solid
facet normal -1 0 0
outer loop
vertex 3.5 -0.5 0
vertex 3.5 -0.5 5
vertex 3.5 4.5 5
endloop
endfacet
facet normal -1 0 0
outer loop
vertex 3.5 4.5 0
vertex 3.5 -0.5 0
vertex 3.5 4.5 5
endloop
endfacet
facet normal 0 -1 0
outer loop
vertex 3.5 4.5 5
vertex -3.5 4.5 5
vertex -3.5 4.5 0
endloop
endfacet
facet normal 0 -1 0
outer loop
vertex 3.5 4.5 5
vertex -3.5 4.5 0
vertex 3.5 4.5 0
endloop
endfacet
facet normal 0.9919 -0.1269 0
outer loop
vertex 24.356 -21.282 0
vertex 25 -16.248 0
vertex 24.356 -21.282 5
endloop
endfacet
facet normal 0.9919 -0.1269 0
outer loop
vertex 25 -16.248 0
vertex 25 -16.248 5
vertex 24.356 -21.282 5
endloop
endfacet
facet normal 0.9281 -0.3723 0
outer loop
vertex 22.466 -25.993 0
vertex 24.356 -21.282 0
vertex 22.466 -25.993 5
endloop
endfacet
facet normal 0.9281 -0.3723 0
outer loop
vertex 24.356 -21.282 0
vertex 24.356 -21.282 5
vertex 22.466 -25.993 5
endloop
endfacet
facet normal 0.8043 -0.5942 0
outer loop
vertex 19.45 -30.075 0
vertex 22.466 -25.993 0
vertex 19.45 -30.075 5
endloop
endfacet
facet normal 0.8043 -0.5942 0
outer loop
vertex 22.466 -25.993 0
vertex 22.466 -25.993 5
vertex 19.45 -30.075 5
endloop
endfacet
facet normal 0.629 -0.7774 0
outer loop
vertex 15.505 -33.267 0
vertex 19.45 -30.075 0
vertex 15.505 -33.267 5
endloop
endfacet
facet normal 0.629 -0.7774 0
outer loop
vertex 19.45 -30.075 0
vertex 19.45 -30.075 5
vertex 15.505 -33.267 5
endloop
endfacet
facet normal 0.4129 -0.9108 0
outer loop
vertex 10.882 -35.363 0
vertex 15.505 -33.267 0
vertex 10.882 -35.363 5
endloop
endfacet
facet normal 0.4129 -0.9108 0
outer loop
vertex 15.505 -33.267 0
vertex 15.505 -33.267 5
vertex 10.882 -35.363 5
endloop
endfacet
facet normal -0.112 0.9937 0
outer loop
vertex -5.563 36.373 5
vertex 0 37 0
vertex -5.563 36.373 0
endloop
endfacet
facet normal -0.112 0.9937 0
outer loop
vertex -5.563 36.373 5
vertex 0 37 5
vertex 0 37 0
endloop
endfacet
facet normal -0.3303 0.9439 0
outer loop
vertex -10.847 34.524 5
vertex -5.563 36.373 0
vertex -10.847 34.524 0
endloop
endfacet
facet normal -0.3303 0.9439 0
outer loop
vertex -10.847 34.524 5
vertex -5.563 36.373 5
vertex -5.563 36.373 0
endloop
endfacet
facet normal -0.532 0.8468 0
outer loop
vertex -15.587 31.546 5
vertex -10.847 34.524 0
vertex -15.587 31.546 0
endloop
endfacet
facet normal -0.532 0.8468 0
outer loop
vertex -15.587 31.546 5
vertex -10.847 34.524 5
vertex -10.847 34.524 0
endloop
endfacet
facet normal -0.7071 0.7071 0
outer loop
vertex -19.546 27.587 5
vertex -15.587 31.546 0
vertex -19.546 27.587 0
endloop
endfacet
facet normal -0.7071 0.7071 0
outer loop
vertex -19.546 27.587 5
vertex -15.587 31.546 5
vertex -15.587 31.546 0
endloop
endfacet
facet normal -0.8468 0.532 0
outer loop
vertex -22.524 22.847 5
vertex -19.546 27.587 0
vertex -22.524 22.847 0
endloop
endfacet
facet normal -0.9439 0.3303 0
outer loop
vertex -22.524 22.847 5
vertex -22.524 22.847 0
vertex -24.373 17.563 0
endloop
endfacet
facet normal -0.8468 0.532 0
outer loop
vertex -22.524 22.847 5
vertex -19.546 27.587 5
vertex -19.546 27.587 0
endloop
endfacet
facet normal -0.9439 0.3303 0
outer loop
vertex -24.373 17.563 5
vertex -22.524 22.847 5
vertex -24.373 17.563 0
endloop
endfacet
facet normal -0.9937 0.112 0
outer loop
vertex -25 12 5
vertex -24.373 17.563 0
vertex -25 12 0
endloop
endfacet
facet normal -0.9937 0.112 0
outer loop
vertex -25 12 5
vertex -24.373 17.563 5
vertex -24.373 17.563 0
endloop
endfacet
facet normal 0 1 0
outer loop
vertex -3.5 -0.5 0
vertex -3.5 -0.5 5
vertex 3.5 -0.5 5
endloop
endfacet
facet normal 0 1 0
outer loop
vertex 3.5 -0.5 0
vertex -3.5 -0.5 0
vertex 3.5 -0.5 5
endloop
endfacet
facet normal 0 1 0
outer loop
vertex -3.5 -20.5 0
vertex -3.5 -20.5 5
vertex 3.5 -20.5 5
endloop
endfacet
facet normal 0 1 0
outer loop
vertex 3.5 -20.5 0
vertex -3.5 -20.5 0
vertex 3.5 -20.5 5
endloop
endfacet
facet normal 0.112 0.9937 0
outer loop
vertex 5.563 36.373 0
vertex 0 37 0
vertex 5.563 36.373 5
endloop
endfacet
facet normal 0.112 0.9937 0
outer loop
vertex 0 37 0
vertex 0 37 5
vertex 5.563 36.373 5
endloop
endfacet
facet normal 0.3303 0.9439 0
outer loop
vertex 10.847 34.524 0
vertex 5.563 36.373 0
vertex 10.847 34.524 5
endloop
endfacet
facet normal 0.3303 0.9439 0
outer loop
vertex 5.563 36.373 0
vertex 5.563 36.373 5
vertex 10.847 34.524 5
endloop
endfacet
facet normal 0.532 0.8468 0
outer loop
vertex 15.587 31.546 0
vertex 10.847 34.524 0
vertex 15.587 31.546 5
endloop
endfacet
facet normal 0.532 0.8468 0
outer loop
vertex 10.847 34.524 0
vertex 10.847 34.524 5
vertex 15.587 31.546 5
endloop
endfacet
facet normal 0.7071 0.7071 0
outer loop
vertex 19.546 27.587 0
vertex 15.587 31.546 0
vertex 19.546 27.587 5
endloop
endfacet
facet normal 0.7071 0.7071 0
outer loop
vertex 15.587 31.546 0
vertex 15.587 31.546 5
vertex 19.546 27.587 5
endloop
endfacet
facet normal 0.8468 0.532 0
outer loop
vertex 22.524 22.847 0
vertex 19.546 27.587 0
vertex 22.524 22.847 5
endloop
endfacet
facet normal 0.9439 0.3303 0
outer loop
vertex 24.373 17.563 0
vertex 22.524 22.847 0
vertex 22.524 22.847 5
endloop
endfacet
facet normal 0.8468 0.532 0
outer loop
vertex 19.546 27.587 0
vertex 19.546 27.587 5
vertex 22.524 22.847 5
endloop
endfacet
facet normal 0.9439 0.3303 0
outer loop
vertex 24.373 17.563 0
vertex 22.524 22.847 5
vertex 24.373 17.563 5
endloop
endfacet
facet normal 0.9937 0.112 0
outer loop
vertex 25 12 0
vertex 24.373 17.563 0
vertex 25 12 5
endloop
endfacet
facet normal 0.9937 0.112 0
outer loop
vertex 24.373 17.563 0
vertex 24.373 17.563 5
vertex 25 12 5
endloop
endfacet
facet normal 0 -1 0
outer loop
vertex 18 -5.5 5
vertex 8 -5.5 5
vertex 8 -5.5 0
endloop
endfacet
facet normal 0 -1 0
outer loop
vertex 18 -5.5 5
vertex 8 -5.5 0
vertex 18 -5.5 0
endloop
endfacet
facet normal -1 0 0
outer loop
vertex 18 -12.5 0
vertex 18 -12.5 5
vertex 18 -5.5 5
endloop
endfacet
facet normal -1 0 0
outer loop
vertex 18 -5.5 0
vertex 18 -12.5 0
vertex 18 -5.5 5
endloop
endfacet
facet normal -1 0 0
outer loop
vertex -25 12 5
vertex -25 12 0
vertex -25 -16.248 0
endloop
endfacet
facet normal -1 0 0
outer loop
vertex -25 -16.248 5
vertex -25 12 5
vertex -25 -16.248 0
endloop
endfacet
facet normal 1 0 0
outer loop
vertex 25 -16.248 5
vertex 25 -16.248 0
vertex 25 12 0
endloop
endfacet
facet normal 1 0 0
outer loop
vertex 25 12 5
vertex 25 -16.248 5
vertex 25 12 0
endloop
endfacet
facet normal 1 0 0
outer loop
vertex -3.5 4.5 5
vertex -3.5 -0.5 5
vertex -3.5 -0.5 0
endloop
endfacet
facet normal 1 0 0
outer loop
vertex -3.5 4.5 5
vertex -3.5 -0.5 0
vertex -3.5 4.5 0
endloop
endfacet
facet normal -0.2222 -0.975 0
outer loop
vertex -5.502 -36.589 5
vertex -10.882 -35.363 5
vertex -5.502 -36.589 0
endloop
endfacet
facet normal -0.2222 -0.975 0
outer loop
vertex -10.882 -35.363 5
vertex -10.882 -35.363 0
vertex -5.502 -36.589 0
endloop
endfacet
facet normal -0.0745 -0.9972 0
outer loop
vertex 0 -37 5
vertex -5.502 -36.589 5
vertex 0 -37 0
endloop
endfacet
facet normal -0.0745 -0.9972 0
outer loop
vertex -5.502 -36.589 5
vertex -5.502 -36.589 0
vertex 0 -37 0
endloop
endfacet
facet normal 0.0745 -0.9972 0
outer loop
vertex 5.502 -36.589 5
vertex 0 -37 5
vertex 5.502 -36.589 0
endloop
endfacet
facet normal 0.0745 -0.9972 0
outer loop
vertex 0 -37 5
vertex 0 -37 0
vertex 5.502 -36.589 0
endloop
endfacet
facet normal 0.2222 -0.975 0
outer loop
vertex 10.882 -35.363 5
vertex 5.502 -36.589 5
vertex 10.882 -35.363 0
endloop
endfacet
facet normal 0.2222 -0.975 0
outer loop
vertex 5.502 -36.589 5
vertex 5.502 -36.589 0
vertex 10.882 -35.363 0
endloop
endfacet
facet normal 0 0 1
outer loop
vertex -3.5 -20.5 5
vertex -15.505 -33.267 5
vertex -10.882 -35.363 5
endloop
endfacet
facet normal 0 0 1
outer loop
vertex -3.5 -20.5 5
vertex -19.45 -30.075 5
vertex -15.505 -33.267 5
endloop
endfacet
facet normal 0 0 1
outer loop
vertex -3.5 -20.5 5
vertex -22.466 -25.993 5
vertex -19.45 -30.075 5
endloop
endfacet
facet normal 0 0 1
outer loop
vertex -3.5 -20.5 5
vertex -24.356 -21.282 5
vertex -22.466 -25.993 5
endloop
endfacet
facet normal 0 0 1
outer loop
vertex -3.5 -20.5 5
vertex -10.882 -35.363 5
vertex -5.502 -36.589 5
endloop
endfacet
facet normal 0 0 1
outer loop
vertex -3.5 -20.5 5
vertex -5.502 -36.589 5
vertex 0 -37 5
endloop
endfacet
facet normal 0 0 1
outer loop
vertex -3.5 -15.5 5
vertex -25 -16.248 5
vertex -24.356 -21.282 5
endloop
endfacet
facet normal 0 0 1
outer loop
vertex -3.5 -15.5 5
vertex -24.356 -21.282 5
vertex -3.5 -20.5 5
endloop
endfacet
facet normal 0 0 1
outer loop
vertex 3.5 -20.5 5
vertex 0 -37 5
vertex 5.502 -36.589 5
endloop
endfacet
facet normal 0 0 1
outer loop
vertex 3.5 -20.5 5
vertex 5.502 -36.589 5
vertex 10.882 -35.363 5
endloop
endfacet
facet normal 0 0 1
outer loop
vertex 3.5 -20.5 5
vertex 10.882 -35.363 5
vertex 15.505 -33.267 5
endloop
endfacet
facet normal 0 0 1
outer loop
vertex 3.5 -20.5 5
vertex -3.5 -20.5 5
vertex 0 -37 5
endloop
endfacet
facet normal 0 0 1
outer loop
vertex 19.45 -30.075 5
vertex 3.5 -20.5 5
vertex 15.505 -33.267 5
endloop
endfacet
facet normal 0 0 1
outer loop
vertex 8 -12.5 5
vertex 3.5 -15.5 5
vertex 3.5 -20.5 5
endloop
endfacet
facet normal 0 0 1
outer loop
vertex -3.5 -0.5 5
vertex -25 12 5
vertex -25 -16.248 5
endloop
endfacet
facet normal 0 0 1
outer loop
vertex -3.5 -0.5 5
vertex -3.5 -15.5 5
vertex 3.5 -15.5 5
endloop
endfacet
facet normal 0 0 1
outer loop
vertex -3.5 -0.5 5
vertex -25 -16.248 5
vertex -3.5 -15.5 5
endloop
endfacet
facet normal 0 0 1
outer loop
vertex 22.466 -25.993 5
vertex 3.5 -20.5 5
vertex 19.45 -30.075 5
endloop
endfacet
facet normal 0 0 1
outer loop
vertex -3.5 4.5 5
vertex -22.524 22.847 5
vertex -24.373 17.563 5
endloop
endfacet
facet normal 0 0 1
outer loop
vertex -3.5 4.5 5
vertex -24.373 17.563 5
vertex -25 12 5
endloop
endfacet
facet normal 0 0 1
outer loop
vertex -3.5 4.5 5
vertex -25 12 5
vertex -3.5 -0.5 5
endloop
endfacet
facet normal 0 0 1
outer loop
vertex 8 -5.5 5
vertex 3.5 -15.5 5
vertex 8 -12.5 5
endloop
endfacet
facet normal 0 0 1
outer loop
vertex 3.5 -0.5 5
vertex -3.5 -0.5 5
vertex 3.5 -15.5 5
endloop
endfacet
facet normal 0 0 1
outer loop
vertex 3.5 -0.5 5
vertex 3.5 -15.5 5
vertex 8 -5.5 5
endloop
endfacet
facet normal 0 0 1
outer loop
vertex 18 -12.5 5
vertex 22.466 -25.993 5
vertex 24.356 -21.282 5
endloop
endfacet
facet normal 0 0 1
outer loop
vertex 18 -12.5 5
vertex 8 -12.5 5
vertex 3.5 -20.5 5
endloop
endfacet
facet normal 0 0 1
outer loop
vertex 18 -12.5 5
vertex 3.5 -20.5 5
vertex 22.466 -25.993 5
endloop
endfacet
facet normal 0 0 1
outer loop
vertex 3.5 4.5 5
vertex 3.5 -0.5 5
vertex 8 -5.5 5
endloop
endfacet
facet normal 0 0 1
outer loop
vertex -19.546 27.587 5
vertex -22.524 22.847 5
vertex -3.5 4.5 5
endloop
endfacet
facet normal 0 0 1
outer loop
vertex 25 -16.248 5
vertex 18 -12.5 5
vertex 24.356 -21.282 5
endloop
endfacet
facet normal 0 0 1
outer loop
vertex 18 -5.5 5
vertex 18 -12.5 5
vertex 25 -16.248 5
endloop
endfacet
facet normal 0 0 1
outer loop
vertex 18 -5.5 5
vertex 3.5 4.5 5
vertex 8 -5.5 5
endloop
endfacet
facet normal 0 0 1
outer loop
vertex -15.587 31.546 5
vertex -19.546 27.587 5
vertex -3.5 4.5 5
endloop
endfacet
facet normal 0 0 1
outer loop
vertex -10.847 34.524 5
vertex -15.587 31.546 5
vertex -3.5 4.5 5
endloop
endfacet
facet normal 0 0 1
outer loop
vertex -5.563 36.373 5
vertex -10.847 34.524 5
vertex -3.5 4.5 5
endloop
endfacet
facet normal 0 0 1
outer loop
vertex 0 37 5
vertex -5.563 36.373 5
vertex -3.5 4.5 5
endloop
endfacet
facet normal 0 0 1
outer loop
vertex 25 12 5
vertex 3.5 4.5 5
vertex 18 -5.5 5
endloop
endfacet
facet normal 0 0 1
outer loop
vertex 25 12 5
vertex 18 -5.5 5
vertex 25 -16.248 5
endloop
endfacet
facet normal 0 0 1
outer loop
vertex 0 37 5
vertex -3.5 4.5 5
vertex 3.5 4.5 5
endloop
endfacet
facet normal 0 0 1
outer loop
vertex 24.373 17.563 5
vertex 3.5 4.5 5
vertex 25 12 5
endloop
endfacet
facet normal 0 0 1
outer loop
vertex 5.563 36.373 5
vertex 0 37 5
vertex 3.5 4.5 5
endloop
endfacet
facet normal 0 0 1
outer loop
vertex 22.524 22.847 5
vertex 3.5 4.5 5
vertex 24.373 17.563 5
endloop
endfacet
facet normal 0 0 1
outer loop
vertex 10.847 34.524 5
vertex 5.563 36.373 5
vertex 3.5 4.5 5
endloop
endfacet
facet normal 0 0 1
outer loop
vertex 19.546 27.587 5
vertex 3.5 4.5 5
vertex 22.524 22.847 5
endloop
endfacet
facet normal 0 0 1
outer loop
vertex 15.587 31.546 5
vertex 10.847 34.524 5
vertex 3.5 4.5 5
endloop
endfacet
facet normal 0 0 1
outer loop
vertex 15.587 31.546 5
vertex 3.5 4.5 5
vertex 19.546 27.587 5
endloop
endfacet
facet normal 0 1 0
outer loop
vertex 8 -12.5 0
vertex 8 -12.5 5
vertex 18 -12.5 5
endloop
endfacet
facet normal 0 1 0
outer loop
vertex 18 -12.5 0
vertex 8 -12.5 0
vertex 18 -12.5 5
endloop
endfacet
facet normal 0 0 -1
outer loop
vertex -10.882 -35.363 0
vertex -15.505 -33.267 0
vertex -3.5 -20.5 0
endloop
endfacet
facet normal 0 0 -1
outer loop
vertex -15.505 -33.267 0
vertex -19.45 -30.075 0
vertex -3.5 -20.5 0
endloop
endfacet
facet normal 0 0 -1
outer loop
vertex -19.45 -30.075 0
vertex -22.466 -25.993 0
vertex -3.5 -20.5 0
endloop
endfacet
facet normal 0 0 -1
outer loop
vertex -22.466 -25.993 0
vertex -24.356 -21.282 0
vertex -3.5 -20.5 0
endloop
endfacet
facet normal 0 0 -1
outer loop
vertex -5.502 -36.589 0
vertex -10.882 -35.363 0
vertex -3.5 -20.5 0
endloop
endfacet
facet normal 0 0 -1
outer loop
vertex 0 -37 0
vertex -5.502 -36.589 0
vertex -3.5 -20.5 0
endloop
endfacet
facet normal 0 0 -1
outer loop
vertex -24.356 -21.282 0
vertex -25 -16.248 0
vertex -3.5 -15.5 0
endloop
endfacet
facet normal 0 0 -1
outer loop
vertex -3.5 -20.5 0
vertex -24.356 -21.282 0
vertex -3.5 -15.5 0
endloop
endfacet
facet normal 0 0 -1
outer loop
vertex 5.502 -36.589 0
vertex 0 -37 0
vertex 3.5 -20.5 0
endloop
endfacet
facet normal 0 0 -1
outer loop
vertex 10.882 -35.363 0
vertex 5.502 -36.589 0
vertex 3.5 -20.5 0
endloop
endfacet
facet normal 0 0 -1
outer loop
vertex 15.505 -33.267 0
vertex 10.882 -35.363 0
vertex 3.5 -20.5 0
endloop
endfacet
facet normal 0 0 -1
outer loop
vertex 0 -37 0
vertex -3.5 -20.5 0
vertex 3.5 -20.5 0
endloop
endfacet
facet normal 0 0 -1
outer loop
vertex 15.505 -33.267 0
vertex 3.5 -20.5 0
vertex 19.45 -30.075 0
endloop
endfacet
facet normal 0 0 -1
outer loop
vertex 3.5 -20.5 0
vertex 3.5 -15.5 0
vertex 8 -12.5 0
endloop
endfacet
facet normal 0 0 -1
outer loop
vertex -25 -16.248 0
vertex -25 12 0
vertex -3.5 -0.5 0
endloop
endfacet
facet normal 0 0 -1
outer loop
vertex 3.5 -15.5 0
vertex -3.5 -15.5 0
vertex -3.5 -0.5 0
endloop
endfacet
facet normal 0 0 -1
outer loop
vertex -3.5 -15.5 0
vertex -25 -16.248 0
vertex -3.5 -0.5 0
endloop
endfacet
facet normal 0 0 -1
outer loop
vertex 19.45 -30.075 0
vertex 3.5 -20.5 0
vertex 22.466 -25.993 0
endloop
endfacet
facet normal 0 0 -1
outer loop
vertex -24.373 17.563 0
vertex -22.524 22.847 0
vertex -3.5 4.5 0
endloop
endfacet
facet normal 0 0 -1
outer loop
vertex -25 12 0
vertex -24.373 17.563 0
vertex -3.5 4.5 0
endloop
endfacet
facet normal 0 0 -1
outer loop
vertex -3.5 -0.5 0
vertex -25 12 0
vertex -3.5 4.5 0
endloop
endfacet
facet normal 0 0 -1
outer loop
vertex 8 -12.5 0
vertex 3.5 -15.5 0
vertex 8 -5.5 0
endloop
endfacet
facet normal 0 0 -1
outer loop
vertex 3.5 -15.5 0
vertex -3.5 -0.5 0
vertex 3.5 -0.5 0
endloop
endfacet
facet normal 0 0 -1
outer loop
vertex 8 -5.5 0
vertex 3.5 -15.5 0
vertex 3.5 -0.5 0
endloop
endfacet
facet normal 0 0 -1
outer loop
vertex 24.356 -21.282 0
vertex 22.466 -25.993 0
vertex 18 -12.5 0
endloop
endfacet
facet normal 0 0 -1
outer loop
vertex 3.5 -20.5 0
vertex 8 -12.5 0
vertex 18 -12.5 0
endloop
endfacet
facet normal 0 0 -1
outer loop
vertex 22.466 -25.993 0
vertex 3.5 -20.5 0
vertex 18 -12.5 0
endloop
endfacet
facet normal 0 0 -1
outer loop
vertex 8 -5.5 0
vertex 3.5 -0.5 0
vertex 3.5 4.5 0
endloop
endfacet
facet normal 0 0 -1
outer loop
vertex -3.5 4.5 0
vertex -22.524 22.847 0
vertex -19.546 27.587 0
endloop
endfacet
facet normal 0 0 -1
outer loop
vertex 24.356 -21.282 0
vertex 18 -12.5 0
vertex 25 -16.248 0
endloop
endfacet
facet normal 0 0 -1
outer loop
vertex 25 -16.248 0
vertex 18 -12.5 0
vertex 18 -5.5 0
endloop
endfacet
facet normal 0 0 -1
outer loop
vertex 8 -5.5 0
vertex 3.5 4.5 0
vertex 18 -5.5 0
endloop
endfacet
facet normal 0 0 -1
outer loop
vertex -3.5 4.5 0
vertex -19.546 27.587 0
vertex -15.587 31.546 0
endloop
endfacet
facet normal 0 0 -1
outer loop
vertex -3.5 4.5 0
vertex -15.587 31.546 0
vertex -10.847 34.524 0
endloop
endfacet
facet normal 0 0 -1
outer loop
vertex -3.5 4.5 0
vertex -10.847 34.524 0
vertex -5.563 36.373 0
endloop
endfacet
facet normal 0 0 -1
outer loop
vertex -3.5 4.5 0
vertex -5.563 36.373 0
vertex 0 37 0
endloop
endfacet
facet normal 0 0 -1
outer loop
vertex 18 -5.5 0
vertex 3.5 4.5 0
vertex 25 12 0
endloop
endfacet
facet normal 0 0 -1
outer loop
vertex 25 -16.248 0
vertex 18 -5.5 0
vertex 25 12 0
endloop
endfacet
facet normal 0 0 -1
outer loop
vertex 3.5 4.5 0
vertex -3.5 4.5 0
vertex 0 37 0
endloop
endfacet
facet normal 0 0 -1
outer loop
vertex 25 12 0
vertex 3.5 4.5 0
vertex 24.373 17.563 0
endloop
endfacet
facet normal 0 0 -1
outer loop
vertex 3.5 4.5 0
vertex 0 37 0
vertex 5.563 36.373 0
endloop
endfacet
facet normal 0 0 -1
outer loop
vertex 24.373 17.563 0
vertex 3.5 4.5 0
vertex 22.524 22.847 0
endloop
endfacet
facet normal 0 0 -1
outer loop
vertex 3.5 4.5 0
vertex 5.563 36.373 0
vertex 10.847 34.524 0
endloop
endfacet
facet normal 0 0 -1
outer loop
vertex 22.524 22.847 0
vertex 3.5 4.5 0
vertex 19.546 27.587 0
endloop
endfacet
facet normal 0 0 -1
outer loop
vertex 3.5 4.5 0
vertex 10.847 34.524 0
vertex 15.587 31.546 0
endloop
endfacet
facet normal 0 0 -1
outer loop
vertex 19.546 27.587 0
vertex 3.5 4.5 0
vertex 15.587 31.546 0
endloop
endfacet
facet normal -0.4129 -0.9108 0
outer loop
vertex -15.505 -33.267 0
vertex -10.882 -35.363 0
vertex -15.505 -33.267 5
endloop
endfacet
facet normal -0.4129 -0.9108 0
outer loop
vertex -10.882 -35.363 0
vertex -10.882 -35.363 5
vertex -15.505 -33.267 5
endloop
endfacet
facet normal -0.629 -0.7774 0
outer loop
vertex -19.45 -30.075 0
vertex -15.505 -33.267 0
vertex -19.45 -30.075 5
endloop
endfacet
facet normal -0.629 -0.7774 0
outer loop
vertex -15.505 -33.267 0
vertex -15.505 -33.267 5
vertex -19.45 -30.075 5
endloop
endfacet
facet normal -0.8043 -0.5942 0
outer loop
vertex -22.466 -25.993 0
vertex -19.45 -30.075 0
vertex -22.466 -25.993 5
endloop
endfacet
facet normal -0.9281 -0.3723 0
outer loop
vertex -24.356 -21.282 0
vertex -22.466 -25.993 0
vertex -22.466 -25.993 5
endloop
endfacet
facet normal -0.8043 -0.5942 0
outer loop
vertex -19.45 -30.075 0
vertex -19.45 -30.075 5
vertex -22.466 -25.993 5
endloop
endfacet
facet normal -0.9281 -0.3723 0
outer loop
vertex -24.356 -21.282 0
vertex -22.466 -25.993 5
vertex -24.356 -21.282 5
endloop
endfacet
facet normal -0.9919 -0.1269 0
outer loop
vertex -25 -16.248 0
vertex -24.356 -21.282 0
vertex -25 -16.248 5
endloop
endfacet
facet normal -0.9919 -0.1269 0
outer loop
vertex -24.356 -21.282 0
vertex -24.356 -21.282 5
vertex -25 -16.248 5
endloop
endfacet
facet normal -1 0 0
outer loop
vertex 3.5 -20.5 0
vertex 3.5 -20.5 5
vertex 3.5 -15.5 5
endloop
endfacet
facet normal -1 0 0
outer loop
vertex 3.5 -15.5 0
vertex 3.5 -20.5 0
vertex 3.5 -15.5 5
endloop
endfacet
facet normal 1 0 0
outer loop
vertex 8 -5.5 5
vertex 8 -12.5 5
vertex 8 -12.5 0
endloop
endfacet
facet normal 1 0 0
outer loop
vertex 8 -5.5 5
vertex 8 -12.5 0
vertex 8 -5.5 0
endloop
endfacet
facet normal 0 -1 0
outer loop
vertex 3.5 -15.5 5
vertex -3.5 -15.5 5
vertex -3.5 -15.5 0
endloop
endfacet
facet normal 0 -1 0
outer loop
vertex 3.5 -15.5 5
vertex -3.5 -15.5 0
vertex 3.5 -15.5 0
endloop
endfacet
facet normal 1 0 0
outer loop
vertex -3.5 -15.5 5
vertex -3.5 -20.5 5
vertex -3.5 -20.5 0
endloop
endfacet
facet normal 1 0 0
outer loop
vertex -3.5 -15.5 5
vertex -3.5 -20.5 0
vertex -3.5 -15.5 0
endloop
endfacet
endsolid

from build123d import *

# Parameters (mm, degrees)
SKETCH1_R           = 37
BOSS_EXTRUDE1_DEPTH = 5
CUT_EXTRUDE3_START  = -10
CUT_EXTRUDE3_DEPTH  = 10
FILLET1_R           = 25
FILLET2_R           = 20
SKETCH11_W          = 7
SKETCH11_H          = 5
CUT_EXTRUDE4_DEPTH  = 10
SKETCH12_W          = 10
SKETCH12_H          = 7
CUT_EXTRUDE5_DEPTH  = 10


with BuildPart() as part:
    # Sketch1 → Boss-Extrude1 (new body)
    with BuildSketch(Plane.XY):
        Circle(SKETCH1_R)
    extrude(amount=BOSS_EXTRUDE1_DEPTH)

    # Sketch10 → Cut-Extrude3 (cut)
    with BuildSketch(Plane.XY.offset(5).offset(CUT_EXTRUDE3_START)):
        with BuildLine():
            Line((-25, 27.276363394), (-25, -27.276363394))
            ThreePointArc((-25, -27.276363394), (-37, 0), (-25, 27.276363394))
        make_face()
        with BuildLine():
            Line((25, -27.276363394), (25, 27.276363394))
            ThreePointArc((25, 27.276363394), (37, 0), (25, -27.276363394))
        make_face()
    extrude(amount=CUT_EXTRUDE3_DEPTH, mode=Mode.SUBTRACT)

    # Fillet1
    fillet1_edges = [part.edges().sort_by_distance(p)[0] for p in [
        (-25, 27.276363394, 2.5),
        (25, 27.276363394, 2.5),
    ]]
    fillet(fillet1_edges, radius=FILLET1_R - 0.0001)  # a hair under: the kernel refuses the full size

    # Fillet2
    fillet2_edges = [part.edges().sort_by_distance(p)[0] for p in [
        (-25, -27.276363394, 2.5),
        (25, -27.276363394, 2.5),
    ]]
    fillet(fillet2_edges, radius=FILLET2_R)

    # Sketch11 → Cut-Extrude4 (cut)
    with BuildSketch(Plane.XY.offset(5)):
        with Locations((0, 2)):
            Rectangle(SKETCH11_W, SKETCH11_H)
        with Locations((0, -18)):
            Rectangle(SKETCH11_W, SKETCH11_H)
    extrude(amount=-CUT_EXTRUDE4_DEPTH, mode=Mode.SUBTRACT)

    # Sketch12 → Cut-Extrude5 (cut)
    with BuildSketch(Plane.XY.offset(5)):
        with Locations((13, -9)):
            Rectangle(SKETCH12_W, SKETCH12_H)
    extrude(amount=-CUT_EXTRUDE5_DEPTH, mode=Mode.SUBTRACT)


solid = part.part
